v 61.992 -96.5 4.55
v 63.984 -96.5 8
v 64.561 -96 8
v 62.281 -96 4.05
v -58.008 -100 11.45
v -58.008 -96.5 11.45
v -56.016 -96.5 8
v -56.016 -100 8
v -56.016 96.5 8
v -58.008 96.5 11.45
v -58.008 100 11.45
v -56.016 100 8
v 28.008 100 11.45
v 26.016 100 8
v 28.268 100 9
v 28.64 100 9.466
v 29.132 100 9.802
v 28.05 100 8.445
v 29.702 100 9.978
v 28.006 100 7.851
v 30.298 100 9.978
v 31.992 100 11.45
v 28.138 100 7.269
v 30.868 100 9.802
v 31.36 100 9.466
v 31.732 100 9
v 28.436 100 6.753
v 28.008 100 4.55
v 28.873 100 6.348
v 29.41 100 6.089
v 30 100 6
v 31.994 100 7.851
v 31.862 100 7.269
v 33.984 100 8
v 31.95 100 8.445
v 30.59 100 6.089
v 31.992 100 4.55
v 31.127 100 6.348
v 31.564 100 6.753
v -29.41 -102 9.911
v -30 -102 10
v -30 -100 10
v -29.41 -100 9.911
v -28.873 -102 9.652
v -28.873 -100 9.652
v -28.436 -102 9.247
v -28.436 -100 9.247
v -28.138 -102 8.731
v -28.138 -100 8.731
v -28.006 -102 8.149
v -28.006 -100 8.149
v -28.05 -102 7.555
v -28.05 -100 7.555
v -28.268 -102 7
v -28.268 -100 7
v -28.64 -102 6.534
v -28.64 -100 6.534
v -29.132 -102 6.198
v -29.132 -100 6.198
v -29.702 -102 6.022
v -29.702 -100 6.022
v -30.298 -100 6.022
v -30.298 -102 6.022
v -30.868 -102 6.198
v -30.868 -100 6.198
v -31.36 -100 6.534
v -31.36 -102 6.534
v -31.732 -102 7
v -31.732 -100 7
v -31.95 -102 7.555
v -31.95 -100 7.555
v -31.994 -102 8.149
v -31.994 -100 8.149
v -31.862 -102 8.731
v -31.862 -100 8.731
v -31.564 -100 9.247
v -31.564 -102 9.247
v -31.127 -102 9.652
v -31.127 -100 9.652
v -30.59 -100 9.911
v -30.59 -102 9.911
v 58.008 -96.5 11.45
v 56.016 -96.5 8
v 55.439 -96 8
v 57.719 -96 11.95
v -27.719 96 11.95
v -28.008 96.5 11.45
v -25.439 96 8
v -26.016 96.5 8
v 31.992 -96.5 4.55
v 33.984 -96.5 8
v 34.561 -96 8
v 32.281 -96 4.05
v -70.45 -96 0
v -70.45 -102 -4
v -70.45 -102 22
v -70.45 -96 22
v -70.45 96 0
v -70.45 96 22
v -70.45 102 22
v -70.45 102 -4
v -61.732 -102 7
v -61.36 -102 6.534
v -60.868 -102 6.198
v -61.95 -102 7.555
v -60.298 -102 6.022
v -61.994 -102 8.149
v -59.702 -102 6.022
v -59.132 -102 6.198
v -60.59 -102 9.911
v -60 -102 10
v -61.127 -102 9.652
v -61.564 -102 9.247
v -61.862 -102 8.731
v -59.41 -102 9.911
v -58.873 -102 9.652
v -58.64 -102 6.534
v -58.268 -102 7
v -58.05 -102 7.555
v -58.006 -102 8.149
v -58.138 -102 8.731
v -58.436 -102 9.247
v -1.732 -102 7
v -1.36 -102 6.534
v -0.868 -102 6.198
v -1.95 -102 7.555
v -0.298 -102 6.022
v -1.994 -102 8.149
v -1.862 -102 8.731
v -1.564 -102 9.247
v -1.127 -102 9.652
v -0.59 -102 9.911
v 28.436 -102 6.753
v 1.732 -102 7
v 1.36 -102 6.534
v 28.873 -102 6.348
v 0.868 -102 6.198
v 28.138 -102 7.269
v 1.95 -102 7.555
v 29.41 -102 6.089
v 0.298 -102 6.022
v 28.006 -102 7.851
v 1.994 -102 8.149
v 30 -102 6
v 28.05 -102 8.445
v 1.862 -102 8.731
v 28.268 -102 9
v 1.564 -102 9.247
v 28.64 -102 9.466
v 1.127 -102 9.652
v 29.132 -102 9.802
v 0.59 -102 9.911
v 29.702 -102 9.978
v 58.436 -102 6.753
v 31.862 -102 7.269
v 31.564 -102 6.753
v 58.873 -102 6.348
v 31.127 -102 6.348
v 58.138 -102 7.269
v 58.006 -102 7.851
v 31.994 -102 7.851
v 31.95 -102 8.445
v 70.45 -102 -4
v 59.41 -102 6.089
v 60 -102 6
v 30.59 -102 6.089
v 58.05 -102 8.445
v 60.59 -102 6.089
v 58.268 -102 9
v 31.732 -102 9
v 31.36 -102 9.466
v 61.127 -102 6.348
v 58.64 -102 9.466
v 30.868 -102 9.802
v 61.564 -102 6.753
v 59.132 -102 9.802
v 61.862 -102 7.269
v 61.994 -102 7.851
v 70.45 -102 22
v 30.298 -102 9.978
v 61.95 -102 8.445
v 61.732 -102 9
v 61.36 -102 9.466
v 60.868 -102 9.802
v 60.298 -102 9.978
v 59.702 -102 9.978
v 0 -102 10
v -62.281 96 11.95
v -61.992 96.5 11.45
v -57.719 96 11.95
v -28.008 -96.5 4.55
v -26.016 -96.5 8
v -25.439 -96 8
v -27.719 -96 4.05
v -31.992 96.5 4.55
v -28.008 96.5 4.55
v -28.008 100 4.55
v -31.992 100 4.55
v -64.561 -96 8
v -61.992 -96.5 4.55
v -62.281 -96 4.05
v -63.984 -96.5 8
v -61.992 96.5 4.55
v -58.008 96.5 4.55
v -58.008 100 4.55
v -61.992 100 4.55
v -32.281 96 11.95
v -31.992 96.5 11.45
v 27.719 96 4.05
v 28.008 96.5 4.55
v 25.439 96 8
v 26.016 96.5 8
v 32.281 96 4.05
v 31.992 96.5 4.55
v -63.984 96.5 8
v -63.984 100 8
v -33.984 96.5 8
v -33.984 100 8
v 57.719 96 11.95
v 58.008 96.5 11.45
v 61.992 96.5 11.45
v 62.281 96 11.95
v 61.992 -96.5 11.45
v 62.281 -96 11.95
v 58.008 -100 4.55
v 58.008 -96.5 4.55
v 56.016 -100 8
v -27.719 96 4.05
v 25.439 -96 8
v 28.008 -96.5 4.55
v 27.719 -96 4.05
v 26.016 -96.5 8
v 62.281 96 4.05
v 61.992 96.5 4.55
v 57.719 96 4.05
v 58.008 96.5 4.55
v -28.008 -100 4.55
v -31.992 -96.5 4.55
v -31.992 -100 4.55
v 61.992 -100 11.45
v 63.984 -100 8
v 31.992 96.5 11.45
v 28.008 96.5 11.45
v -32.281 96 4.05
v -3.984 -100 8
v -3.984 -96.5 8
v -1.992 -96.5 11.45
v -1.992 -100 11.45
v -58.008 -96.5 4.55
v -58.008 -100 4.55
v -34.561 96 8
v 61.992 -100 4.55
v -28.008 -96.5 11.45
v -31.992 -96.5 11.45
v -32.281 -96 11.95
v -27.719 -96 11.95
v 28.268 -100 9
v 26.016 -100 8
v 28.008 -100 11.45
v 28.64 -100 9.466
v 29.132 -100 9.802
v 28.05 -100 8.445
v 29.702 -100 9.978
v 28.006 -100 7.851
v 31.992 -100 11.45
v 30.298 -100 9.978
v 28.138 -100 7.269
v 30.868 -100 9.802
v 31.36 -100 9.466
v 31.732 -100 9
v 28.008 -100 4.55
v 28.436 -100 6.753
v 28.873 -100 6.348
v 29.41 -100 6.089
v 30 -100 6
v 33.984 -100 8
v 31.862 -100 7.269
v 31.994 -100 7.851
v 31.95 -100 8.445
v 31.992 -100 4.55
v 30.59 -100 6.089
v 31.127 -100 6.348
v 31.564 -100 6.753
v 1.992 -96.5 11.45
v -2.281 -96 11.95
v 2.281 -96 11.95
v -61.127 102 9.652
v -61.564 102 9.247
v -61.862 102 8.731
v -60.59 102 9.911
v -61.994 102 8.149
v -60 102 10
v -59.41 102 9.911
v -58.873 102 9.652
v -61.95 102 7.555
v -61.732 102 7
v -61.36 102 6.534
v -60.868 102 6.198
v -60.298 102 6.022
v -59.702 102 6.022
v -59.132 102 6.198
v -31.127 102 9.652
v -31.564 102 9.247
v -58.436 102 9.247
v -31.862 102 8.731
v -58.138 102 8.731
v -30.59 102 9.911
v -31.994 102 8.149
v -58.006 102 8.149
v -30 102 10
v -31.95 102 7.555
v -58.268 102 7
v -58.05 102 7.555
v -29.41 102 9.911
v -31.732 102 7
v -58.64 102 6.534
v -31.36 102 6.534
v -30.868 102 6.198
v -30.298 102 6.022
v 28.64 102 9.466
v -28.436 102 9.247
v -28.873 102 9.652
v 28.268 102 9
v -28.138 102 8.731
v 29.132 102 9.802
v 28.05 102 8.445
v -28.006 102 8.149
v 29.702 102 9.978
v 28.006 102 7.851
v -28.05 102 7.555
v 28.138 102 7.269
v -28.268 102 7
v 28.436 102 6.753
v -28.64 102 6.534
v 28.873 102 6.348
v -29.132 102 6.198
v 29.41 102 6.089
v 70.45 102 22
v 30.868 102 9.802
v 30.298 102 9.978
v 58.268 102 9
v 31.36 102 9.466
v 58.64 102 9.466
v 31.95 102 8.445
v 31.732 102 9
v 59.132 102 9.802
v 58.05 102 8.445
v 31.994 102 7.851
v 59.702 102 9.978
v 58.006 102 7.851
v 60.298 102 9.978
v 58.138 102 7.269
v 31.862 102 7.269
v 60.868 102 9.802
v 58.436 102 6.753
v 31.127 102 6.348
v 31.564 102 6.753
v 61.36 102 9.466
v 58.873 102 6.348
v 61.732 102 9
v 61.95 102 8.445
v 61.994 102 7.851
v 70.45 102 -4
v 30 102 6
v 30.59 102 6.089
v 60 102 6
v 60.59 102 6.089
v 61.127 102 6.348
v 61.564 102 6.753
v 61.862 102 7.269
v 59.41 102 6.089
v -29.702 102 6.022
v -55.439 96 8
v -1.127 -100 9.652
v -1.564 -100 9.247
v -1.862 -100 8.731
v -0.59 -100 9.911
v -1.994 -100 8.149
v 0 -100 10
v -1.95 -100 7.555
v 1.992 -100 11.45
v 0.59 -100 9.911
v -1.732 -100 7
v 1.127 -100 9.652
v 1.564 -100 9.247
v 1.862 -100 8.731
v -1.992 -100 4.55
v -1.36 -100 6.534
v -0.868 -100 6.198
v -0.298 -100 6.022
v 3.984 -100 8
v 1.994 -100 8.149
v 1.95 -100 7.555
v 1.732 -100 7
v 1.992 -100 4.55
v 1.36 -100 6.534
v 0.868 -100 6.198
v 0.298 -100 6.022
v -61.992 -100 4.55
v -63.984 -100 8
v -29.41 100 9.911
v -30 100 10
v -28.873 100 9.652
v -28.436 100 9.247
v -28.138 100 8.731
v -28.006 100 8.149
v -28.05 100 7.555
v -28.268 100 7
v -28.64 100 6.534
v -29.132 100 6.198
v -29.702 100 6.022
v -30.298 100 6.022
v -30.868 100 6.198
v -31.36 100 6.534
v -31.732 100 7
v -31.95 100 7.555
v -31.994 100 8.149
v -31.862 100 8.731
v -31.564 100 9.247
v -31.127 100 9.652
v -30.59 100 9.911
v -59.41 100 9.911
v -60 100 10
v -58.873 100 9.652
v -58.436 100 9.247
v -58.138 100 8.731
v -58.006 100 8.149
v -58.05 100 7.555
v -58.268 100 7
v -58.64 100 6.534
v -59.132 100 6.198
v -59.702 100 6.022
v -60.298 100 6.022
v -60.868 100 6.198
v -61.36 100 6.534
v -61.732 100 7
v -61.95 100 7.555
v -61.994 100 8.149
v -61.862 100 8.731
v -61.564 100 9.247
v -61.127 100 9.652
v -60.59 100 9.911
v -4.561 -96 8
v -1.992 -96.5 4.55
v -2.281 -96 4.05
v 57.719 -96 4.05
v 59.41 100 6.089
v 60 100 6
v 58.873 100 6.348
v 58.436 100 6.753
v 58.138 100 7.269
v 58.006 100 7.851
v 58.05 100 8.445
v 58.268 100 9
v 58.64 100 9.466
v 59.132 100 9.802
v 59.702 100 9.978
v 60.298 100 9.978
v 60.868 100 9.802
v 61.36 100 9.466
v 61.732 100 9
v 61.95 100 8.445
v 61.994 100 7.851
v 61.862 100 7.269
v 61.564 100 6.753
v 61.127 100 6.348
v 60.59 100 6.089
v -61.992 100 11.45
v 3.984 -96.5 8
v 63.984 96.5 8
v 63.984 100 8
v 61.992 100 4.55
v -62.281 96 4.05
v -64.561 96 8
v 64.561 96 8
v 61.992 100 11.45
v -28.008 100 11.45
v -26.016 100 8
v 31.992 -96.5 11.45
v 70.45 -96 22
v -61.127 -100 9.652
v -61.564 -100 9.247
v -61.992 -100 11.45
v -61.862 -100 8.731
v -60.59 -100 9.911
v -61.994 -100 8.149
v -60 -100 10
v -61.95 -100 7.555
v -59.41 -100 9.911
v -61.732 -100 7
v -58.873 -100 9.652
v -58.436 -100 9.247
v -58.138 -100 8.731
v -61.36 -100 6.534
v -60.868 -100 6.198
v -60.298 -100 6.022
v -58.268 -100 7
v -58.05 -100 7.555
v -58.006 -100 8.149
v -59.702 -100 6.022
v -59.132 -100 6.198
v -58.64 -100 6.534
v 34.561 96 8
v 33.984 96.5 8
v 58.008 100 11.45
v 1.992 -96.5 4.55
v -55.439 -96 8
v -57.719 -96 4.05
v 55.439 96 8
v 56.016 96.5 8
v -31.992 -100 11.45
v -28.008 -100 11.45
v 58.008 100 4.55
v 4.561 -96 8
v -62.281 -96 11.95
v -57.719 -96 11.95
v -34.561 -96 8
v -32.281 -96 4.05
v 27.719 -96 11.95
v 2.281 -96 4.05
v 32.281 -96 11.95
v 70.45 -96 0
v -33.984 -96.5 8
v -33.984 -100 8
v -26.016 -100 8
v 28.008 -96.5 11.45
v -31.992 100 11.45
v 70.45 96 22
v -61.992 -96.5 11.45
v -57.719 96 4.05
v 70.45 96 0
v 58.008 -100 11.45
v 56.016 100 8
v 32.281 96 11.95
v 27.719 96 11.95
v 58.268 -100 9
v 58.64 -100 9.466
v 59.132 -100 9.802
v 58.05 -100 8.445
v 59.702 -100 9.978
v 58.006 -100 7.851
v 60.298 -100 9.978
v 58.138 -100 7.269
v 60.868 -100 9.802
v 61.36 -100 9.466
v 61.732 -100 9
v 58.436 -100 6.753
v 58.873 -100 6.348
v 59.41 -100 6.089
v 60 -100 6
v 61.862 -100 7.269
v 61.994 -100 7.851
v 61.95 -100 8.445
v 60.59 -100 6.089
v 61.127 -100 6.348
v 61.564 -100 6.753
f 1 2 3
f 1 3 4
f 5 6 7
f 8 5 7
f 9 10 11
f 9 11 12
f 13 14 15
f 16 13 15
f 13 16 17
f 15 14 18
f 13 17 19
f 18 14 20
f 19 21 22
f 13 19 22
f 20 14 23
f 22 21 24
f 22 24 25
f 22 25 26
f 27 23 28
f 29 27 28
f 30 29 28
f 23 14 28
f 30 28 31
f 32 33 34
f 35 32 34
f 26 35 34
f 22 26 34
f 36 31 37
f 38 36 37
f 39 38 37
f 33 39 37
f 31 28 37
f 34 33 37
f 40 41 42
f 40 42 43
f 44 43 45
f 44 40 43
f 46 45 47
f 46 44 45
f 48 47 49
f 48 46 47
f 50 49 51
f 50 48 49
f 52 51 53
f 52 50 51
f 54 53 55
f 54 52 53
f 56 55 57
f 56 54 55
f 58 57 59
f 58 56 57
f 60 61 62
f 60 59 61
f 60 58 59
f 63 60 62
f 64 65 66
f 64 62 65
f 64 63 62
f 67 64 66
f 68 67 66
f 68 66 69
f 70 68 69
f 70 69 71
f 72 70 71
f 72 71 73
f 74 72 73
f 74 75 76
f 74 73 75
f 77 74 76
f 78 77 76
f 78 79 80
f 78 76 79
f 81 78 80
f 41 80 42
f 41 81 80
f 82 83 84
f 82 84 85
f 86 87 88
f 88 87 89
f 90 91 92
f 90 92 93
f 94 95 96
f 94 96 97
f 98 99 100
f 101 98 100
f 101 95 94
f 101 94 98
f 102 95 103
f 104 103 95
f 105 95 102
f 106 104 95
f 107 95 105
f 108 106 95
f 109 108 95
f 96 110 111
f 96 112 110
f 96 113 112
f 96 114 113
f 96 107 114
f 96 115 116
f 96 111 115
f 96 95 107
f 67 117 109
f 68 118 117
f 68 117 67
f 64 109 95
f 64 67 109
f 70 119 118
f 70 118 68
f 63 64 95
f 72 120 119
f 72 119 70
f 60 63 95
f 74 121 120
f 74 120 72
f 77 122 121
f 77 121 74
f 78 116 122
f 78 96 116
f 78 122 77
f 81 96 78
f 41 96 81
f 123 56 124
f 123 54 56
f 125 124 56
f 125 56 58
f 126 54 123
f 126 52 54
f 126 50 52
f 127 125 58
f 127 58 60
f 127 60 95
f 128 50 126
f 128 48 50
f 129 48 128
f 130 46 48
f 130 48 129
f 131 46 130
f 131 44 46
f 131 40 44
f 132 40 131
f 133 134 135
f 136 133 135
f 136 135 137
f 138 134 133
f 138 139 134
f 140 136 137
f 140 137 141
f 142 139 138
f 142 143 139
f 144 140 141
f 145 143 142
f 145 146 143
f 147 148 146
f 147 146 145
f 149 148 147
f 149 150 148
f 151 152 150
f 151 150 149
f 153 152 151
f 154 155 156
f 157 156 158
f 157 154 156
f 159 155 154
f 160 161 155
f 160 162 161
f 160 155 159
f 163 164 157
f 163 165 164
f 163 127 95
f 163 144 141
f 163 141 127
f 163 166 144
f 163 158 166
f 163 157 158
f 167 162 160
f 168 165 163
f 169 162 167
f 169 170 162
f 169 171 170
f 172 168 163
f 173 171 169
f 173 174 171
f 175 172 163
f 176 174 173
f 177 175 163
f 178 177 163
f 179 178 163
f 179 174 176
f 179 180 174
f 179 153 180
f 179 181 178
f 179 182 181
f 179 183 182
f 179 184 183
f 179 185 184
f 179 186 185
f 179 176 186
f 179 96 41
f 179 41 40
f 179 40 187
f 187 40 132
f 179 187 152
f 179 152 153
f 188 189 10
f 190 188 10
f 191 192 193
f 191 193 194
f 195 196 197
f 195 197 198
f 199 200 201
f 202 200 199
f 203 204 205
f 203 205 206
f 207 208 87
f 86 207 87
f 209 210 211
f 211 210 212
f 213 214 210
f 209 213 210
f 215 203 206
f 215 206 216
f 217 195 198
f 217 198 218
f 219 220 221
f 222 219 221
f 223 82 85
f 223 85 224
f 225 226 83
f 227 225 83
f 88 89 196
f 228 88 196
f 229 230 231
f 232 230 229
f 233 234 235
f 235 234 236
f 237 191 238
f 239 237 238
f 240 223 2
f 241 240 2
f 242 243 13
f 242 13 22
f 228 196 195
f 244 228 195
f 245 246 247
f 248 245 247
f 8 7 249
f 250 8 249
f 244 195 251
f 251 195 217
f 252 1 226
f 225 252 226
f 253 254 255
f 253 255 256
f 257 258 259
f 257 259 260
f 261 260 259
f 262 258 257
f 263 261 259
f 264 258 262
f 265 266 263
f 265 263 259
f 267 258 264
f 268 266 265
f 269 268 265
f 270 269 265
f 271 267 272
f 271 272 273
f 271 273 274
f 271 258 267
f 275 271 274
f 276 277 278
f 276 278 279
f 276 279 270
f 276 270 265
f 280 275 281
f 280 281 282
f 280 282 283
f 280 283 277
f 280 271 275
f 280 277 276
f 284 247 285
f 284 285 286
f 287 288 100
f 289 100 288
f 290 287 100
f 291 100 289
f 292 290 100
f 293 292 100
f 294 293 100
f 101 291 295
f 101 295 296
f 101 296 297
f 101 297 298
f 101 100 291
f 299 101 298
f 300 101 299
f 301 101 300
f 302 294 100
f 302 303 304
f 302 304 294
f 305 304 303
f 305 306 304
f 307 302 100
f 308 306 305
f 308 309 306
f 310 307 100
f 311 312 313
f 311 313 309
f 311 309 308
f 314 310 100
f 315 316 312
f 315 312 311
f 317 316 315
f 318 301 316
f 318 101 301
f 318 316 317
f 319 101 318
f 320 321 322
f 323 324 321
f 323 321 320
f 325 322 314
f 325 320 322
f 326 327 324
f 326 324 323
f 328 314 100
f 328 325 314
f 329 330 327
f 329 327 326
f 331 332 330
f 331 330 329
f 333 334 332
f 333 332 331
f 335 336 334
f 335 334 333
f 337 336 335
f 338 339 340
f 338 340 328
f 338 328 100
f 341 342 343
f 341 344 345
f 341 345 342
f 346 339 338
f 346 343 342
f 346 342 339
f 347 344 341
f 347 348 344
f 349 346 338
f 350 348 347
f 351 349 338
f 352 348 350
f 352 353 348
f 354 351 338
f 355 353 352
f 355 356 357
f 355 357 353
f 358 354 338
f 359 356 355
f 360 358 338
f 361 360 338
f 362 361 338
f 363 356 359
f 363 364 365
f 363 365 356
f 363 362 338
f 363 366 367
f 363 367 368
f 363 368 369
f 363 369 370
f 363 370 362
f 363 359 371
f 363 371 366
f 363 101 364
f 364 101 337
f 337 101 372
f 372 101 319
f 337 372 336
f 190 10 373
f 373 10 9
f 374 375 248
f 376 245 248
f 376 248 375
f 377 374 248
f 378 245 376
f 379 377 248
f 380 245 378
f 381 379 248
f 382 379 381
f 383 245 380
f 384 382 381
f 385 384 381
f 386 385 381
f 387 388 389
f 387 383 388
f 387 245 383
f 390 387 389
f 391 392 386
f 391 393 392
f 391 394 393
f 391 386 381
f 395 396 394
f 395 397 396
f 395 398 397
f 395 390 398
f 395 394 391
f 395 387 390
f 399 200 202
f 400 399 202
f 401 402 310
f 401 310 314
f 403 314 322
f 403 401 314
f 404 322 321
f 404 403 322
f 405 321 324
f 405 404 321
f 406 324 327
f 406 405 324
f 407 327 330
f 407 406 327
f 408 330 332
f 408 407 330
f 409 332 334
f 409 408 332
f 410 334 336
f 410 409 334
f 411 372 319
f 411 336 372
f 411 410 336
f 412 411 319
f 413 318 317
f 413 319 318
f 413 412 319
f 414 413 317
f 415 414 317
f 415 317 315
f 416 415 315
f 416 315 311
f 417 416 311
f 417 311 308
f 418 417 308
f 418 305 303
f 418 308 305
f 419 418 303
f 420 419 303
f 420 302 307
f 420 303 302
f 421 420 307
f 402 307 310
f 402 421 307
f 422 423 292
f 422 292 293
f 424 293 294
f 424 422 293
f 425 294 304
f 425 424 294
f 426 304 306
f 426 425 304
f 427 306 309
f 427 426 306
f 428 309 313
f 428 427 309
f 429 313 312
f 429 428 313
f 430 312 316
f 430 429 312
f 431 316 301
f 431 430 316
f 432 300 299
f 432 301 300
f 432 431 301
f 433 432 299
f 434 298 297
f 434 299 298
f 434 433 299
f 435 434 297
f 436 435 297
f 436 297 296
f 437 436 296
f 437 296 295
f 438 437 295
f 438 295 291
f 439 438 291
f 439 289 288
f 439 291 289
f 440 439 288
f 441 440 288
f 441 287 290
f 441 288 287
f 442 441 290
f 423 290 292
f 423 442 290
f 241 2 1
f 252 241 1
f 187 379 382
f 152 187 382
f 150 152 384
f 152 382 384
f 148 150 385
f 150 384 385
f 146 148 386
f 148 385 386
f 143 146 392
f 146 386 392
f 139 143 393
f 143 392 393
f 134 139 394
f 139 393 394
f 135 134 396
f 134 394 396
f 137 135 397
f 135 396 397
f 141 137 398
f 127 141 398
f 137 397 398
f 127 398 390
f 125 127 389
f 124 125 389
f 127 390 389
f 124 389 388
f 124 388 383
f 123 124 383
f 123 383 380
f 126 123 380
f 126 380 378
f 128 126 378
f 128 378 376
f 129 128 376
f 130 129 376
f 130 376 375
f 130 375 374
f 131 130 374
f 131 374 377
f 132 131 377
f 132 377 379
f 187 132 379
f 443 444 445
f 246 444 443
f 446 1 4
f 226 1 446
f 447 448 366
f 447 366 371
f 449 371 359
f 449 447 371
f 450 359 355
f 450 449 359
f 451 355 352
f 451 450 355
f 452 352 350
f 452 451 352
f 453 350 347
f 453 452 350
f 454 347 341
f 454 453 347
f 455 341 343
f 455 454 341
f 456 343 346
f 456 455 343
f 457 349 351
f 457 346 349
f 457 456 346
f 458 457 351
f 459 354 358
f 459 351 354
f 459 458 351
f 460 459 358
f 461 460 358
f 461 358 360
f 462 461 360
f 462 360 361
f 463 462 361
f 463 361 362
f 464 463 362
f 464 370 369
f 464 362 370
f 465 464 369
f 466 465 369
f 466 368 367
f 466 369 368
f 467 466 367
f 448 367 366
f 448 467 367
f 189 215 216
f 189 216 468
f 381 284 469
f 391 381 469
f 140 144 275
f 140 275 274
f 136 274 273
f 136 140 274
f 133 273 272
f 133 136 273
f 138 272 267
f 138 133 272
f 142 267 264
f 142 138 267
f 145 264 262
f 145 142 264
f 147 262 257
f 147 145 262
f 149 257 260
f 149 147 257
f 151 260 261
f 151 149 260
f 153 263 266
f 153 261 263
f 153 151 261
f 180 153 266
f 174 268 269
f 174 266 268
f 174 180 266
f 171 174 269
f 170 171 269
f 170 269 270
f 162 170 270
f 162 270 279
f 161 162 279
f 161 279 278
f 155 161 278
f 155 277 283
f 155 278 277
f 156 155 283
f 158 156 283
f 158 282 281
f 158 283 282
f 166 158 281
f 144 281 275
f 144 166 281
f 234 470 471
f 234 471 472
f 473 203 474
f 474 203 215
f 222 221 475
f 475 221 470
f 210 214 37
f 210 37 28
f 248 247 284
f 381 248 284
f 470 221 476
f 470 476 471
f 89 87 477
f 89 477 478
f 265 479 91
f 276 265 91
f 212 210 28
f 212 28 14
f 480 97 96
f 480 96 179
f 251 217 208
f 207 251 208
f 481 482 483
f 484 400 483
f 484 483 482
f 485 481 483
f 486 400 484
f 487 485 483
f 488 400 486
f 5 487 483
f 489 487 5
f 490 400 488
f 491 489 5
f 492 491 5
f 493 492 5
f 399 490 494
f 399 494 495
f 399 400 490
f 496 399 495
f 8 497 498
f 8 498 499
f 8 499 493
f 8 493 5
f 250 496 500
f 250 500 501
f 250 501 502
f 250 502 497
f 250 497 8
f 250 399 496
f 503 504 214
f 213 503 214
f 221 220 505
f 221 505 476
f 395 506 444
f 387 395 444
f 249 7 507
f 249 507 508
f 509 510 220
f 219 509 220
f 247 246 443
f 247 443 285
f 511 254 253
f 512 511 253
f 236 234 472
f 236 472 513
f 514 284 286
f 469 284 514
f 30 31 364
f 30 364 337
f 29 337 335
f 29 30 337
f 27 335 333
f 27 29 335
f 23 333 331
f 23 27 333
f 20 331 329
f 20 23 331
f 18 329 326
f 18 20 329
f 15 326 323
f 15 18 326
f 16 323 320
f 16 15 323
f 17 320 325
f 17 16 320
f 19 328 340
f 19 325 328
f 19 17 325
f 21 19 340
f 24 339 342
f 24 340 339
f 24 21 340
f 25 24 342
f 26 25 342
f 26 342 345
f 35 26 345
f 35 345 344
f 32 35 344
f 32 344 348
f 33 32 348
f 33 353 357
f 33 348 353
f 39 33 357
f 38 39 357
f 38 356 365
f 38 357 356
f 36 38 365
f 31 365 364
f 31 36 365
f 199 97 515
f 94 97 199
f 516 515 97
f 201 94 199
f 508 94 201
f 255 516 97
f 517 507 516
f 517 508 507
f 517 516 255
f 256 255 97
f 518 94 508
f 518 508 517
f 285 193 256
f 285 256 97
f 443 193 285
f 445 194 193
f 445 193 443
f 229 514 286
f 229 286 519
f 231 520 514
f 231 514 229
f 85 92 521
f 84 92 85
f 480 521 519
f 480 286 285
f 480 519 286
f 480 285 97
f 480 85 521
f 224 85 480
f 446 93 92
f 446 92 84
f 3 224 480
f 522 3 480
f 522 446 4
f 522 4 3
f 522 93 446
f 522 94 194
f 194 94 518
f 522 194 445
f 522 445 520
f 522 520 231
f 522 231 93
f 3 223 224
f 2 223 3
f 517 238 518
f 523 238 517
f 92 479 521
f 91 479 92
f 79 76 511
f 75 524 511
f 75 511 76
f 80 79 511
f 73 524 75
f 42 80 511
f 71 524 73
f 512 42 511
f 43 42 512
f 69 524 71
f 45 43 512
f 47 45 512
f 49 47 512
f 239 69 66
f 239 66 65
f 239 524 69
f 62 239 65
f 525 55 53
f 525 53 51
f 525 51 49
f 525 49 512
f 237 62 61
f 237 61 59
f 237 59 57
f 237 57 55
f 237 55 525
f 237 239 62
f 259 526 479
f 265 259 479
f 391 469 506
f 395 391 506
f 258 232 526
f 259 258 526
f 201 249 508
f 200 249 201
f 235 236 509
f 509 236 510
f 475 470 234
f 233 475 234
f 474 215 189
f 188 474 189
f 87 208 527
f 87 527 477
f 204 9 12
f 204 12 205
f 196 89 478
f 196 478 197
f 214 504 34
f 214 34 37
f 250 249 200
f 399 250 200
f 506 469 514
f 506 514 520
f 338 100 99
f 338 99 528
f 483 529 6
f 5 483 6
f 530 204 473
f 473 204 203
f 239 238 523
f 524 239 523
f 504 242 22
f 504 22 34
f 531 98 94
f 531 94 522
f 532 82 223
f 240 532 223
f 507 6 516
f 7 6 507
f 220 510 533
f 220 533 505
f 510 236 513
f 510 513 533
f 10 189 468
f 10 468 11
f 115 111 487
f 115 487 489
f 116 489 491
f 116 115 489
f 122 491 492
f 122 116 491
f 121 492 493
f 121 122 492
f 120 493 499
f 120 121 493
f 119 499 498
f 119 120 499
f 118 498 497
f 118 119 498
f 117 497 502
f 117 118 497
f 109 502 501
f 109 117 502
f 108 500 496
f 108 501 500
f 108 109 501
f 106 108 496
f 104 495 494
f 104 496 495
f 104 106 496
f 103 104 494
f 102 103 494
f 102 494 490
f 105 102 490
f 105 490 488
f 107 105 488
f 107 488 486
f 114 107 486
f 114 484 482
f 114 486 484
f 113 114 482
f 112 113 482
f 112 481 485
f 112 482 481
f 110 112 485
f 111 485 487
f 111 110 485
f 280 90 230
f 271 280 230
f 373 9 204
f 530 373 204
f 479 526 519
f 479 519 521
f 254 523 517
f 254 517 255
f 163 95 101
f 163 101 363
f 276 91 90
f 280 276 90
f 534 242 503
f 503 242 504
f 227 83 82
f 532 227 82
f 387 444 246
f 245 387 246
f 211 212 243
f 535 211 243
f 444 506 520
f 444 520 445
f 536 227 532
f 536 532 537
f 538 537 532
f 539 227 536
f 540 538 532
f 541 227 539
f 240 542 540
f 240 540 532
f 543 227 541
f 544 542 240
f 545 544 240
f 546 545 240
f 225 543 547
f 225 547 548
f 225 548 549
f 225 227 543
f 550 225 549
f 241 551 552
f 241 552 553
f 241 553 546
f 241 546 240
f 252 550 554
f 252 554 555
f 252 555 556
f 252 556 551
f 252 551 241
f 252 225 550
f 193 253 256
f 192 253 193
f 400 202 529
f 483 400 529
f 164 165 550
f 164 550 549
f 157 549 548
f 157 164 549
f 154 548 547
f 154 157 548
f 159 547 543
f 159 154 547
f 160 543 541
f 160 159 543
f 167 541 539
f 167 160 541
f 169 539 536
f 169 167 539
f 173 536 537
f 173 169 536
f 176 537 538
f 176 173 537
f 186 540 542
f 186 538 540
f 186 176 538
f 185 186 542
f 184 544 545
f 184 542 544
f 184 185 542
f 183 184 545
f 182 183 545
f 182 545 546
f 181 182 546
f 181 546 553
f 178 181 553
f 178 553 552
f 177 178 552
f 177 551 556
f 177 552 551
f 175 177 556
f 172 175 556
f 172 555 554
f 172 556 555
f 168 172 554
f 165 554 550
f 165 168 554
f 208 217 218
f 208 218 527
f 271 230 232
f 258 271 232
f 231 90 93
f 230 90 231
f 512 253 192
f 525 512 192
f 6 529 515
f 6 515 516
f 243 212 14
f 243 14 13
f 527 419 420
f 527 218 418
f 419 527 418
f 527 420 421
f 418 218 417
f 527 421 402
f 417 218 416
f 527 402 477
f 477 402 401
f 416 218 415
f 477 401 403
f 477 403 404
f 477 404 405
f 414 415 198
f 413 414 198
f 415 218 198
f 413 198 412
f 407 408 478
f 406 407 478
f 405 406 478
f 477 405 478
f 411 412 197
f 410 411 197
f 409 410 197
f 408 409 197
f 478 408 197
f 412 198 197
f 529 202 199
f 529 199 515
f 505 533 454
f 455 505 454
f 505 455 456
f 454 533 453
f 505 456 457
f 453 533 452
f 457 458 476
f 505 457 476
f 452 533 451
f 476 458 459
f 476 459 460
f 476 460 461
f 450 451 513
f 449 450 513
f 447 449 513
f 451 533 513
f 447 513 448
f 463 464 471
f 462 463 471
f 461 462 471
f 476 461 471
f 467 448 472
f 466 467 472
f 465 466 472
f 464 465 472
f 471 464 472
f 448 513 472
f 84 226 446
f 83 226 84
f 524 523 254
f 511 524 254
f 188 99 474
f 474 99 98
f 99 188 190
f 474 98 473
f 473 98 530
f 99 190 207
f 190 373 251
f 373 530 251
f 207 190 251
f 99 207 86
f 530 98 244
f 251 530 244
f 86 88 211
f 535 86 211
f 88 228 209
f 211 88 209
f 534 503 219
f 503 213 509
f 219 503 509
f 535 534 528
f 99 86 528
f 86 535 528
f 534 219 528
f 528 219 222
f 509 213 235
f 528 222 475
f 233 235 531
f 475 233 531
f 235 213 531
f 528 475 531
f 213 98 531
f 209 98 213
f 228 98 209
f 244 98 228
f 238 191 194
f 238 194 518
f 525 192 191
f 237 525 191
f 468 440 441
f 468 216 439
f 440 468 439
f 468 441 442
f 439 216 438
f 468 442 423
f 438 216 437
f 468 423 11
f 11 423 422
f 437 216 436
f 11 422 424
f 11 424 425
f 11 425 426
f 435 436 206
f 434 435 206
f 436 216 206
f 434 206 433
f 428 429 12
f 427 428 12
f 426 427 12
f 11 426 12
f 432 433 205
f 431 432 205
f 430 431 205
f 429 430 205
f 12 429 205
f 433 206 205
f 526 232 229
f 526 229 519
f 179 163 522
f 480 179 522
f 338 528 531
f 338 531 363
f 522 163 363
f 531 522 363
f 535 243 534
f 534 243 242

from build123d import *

# Parameters (mm, degrees)
SKETCH1_W               = 140.9
SKETCH1_H               = 204
BOSS_EXTRUDE1_DEPTH     = 4
SKETCH4_W               = 140.9
SKETCH4_H               = 6
BOSS_EXTRUDE3_DEPTH     = 22
CUT_EXTRUDE1_DEPTH      = 217.940550612
CUT_EXTRUDE1_DEPTH_BACK = 217.940550612
SKETCH5_R               = 2
CUT_EXTRUDE4_DEPTH      = 4
SKETCH9_R               = 2
CUT_EXTRUDE5_DEPTH      = 212.308311479
CUT_EXTRUDE6_DEPTH      = 4
CHAMFER1_SIZE           = 0.5


with BuildPart() as part:
    # Sketch1 → Boss-Extrude1 (new body)
    with BuildSketch(Plane.XY):
        Rectangle(SKETCH1_W, SKETCH1_H)
    extrude(amount=-BOSS_EXTRUDE1_DEPTH)

    # Sketch4 → Boss-Extrude3 (add)
    with BuildSketch(Plane.XY):
        with Locations((0, 99)):
            Rectangle(SKETCH4_W, SKETCH4_H)
        with Locations((0, -99)):
            Rectangle(SKETCH4_W, SKETCH4_H)
    extrude(amount=BOSS_EXTRUDE3_DEPTH)

    # Sketch5 → Cut-Extrude1 (cut, two sides: drawn at the far end of the back side and taken through both)
    with BuildSketch(Plane(origin=(0, 102, 0), x_dir=(1, 0, 0), z_dir=(0, 1, 0)).offset(-CUT_EXTRUDE1_DEPTH_BACK)):
        with Locations(Location((-30, -8, 0), (0, 0, 270))):
            Circle(SKETCH5_R)
        with Locations(Location((-60, -8, 0), (0, 0, 270))):
            Circle(SKETCH5_R)
        with Locations(Location((60, -8, 0), (0, 0, 90))):
            Circle(SKETCH5_R)
        with Locations(Location((30, -8, 0), (0, 0, 90))):
            Circle(SKETCH5_R)
    extrude(amount=CUT_EXTRUDE1_DEPTH + CUT_EXTRUDE1_DEPTH_BACK, mode=Mode.SUBTRACT)

    # Sketch8 → Cut-Extrude4 (cut)
    with BuildSketch(Plane(origin=(0, -96, 0), x_dir=(1, 0, 0), z_dir=(0, 1, 0))):
        Polygon((-26.016283143, -8), (-28.008141571, -4.55), (-31.991858429, -4.55), (-33.983716857, -8), (-31.991858429, -11.45), (-28.008141571, -11.45), align=None)
        Polygon((-56.016283143, -8), (-58.008141571, -4.55), (-61.991858429, -4.55), (-63.983716857, -8), (-61.991858429, -11.45), (-58.008141571, -11.45), align=None)
        Polygon((33.983716857, -8), (31.991858429, -4.55), (28.008141571, -4.55), (26.016283143, -8), (28.008141571, -11.45), (31.991858429, -11.45), align=None)
        Polygon((63.983716857, -8), (61.991858429, -4.55), (58.008141571, -4.55), (56.016283143, -8), (58.008141571, -11.45), (61.991858429, -11.45), align=None)
    cut_extrude4 = extrude(amount=-CUT_EXTRUDE4_DEPTH, mode=Mode.SUBTRACT)

    # Mirror1: Cut-Extrude4 across plane
    add(cut_extrude4.mirror(Plane.ZX), mode=Mode.SUBTRACT)

    # Sketch9 → Cut-Extrude5 (cut, through all)
    with BuildSketch(Plane(origin=(0, -96, 0), x_dir=(1, 0, 0), z_dir=(0, 1, 0))):
        with Locations(Location((0, -8, 0), (0, 0, 270))):
            Circle(SKETCH9_R)
    extrude(amount=-CUT_EXTRUDE5_DEPTH, mode=Mode.SUBTRACT)

    # Sketch10 → Cut-Extrude6 (cut)
    with BuildSketch(Plane(origin=(0, -96, 0), x_dir=(1, 0, 0), z_dir=(0, 1, 0))):
        Polygon((1.991858429, -4.55), (-1.991858429, -4.55), (-3.983716857, -8), (-1.991858429, -11.45), (1.991858429, -11.45), (3.983716857, -8), align=None)
    extrude(amount=-CUT_EXTRUDE6_DEPTH, mode=Mode.SUBTRACT)

    # Chamfer1
    chamfer1_edges = [part.edges().sort_by_distance(p)[0] for p in [
        (32.987787643, -96, 9.725),
        (32.987787643, -96, 6.275),
        (30, -96, 4.55),
        (27.012212357, -96, 6.275),
        (27.012212357, -96, 9.725),
        (30, -96, 11.45),
        (62.987787643, -96, 9.725),
        (62.987787643, -96, 6.275),
        (60, -96, 4.55),
        (57.012212357, -96, 6.275),
        (57.012212357, -96, 9.725),
        (60, -96, 11.45),
        (-57.012212357, 96, 9.725),
        (-57.012212357, 96, 6.275),
        (-60, 96, 4.55),
        (-62.987787643, 96, 6.275),
        (-62.987787643, 96, 9.725),
        (-60, 96, 11.45),
        (-27.012212357, 96, 9.725),
        (-27.012212357, 96, 6.275),
        (-30, 96, 4.55),
        (-32.987787643, 96, 6.275),
        (-32.987787643, 96, 9.725),
        (-30, 96, 11.45),
        (32.987787643, 96, 9.725),
        (32.987787643, 96, 6.275),
        (30, 96, 4.55),
        (27.012212357, 96, 6.275),
        (27.012212357, 96, 9.725),
        (30, 96, 11.45),
        (62.987787643, 96, 9.725),
        (62.987787643, 96, 6.275),
        (60, 96, 4.55),
        (57.012212357, 96, 6.275),
        (57.012212357, 96, 9.725),
        (60, 96, 11.45),
        (2.987787643, -96, 6.275),
        (0, -96, 4.55),
        (-2.987787643, -96, 6.275),
        (-2.987787643, -96, 9.725),
        (0, -96, 11.45),
        (2.987787643, -96, 9.725),
        (-57.012212357, -96, 9.725),
        (-57.012212357, -96, 6.275),
        (-60, -96, 4.55),
        (-62.987787643, -96, 6.275),
        (-62.987787643, -96, 9.725),
        (-60, -96, 11.45),
        (-27.012212357, -96, 9.725),
        (-27.012212357, -96, 6.275),
        (-30, -96, 4.55),
        (-32.987787643, -96, 6.275),
        (-32.987787643, -96, 9.725),
        (-30, -96, 11.45),
    ]]
    chamfer(chamfer1_edges, length=CHAMFER1_SIZE)


solid = part.part
